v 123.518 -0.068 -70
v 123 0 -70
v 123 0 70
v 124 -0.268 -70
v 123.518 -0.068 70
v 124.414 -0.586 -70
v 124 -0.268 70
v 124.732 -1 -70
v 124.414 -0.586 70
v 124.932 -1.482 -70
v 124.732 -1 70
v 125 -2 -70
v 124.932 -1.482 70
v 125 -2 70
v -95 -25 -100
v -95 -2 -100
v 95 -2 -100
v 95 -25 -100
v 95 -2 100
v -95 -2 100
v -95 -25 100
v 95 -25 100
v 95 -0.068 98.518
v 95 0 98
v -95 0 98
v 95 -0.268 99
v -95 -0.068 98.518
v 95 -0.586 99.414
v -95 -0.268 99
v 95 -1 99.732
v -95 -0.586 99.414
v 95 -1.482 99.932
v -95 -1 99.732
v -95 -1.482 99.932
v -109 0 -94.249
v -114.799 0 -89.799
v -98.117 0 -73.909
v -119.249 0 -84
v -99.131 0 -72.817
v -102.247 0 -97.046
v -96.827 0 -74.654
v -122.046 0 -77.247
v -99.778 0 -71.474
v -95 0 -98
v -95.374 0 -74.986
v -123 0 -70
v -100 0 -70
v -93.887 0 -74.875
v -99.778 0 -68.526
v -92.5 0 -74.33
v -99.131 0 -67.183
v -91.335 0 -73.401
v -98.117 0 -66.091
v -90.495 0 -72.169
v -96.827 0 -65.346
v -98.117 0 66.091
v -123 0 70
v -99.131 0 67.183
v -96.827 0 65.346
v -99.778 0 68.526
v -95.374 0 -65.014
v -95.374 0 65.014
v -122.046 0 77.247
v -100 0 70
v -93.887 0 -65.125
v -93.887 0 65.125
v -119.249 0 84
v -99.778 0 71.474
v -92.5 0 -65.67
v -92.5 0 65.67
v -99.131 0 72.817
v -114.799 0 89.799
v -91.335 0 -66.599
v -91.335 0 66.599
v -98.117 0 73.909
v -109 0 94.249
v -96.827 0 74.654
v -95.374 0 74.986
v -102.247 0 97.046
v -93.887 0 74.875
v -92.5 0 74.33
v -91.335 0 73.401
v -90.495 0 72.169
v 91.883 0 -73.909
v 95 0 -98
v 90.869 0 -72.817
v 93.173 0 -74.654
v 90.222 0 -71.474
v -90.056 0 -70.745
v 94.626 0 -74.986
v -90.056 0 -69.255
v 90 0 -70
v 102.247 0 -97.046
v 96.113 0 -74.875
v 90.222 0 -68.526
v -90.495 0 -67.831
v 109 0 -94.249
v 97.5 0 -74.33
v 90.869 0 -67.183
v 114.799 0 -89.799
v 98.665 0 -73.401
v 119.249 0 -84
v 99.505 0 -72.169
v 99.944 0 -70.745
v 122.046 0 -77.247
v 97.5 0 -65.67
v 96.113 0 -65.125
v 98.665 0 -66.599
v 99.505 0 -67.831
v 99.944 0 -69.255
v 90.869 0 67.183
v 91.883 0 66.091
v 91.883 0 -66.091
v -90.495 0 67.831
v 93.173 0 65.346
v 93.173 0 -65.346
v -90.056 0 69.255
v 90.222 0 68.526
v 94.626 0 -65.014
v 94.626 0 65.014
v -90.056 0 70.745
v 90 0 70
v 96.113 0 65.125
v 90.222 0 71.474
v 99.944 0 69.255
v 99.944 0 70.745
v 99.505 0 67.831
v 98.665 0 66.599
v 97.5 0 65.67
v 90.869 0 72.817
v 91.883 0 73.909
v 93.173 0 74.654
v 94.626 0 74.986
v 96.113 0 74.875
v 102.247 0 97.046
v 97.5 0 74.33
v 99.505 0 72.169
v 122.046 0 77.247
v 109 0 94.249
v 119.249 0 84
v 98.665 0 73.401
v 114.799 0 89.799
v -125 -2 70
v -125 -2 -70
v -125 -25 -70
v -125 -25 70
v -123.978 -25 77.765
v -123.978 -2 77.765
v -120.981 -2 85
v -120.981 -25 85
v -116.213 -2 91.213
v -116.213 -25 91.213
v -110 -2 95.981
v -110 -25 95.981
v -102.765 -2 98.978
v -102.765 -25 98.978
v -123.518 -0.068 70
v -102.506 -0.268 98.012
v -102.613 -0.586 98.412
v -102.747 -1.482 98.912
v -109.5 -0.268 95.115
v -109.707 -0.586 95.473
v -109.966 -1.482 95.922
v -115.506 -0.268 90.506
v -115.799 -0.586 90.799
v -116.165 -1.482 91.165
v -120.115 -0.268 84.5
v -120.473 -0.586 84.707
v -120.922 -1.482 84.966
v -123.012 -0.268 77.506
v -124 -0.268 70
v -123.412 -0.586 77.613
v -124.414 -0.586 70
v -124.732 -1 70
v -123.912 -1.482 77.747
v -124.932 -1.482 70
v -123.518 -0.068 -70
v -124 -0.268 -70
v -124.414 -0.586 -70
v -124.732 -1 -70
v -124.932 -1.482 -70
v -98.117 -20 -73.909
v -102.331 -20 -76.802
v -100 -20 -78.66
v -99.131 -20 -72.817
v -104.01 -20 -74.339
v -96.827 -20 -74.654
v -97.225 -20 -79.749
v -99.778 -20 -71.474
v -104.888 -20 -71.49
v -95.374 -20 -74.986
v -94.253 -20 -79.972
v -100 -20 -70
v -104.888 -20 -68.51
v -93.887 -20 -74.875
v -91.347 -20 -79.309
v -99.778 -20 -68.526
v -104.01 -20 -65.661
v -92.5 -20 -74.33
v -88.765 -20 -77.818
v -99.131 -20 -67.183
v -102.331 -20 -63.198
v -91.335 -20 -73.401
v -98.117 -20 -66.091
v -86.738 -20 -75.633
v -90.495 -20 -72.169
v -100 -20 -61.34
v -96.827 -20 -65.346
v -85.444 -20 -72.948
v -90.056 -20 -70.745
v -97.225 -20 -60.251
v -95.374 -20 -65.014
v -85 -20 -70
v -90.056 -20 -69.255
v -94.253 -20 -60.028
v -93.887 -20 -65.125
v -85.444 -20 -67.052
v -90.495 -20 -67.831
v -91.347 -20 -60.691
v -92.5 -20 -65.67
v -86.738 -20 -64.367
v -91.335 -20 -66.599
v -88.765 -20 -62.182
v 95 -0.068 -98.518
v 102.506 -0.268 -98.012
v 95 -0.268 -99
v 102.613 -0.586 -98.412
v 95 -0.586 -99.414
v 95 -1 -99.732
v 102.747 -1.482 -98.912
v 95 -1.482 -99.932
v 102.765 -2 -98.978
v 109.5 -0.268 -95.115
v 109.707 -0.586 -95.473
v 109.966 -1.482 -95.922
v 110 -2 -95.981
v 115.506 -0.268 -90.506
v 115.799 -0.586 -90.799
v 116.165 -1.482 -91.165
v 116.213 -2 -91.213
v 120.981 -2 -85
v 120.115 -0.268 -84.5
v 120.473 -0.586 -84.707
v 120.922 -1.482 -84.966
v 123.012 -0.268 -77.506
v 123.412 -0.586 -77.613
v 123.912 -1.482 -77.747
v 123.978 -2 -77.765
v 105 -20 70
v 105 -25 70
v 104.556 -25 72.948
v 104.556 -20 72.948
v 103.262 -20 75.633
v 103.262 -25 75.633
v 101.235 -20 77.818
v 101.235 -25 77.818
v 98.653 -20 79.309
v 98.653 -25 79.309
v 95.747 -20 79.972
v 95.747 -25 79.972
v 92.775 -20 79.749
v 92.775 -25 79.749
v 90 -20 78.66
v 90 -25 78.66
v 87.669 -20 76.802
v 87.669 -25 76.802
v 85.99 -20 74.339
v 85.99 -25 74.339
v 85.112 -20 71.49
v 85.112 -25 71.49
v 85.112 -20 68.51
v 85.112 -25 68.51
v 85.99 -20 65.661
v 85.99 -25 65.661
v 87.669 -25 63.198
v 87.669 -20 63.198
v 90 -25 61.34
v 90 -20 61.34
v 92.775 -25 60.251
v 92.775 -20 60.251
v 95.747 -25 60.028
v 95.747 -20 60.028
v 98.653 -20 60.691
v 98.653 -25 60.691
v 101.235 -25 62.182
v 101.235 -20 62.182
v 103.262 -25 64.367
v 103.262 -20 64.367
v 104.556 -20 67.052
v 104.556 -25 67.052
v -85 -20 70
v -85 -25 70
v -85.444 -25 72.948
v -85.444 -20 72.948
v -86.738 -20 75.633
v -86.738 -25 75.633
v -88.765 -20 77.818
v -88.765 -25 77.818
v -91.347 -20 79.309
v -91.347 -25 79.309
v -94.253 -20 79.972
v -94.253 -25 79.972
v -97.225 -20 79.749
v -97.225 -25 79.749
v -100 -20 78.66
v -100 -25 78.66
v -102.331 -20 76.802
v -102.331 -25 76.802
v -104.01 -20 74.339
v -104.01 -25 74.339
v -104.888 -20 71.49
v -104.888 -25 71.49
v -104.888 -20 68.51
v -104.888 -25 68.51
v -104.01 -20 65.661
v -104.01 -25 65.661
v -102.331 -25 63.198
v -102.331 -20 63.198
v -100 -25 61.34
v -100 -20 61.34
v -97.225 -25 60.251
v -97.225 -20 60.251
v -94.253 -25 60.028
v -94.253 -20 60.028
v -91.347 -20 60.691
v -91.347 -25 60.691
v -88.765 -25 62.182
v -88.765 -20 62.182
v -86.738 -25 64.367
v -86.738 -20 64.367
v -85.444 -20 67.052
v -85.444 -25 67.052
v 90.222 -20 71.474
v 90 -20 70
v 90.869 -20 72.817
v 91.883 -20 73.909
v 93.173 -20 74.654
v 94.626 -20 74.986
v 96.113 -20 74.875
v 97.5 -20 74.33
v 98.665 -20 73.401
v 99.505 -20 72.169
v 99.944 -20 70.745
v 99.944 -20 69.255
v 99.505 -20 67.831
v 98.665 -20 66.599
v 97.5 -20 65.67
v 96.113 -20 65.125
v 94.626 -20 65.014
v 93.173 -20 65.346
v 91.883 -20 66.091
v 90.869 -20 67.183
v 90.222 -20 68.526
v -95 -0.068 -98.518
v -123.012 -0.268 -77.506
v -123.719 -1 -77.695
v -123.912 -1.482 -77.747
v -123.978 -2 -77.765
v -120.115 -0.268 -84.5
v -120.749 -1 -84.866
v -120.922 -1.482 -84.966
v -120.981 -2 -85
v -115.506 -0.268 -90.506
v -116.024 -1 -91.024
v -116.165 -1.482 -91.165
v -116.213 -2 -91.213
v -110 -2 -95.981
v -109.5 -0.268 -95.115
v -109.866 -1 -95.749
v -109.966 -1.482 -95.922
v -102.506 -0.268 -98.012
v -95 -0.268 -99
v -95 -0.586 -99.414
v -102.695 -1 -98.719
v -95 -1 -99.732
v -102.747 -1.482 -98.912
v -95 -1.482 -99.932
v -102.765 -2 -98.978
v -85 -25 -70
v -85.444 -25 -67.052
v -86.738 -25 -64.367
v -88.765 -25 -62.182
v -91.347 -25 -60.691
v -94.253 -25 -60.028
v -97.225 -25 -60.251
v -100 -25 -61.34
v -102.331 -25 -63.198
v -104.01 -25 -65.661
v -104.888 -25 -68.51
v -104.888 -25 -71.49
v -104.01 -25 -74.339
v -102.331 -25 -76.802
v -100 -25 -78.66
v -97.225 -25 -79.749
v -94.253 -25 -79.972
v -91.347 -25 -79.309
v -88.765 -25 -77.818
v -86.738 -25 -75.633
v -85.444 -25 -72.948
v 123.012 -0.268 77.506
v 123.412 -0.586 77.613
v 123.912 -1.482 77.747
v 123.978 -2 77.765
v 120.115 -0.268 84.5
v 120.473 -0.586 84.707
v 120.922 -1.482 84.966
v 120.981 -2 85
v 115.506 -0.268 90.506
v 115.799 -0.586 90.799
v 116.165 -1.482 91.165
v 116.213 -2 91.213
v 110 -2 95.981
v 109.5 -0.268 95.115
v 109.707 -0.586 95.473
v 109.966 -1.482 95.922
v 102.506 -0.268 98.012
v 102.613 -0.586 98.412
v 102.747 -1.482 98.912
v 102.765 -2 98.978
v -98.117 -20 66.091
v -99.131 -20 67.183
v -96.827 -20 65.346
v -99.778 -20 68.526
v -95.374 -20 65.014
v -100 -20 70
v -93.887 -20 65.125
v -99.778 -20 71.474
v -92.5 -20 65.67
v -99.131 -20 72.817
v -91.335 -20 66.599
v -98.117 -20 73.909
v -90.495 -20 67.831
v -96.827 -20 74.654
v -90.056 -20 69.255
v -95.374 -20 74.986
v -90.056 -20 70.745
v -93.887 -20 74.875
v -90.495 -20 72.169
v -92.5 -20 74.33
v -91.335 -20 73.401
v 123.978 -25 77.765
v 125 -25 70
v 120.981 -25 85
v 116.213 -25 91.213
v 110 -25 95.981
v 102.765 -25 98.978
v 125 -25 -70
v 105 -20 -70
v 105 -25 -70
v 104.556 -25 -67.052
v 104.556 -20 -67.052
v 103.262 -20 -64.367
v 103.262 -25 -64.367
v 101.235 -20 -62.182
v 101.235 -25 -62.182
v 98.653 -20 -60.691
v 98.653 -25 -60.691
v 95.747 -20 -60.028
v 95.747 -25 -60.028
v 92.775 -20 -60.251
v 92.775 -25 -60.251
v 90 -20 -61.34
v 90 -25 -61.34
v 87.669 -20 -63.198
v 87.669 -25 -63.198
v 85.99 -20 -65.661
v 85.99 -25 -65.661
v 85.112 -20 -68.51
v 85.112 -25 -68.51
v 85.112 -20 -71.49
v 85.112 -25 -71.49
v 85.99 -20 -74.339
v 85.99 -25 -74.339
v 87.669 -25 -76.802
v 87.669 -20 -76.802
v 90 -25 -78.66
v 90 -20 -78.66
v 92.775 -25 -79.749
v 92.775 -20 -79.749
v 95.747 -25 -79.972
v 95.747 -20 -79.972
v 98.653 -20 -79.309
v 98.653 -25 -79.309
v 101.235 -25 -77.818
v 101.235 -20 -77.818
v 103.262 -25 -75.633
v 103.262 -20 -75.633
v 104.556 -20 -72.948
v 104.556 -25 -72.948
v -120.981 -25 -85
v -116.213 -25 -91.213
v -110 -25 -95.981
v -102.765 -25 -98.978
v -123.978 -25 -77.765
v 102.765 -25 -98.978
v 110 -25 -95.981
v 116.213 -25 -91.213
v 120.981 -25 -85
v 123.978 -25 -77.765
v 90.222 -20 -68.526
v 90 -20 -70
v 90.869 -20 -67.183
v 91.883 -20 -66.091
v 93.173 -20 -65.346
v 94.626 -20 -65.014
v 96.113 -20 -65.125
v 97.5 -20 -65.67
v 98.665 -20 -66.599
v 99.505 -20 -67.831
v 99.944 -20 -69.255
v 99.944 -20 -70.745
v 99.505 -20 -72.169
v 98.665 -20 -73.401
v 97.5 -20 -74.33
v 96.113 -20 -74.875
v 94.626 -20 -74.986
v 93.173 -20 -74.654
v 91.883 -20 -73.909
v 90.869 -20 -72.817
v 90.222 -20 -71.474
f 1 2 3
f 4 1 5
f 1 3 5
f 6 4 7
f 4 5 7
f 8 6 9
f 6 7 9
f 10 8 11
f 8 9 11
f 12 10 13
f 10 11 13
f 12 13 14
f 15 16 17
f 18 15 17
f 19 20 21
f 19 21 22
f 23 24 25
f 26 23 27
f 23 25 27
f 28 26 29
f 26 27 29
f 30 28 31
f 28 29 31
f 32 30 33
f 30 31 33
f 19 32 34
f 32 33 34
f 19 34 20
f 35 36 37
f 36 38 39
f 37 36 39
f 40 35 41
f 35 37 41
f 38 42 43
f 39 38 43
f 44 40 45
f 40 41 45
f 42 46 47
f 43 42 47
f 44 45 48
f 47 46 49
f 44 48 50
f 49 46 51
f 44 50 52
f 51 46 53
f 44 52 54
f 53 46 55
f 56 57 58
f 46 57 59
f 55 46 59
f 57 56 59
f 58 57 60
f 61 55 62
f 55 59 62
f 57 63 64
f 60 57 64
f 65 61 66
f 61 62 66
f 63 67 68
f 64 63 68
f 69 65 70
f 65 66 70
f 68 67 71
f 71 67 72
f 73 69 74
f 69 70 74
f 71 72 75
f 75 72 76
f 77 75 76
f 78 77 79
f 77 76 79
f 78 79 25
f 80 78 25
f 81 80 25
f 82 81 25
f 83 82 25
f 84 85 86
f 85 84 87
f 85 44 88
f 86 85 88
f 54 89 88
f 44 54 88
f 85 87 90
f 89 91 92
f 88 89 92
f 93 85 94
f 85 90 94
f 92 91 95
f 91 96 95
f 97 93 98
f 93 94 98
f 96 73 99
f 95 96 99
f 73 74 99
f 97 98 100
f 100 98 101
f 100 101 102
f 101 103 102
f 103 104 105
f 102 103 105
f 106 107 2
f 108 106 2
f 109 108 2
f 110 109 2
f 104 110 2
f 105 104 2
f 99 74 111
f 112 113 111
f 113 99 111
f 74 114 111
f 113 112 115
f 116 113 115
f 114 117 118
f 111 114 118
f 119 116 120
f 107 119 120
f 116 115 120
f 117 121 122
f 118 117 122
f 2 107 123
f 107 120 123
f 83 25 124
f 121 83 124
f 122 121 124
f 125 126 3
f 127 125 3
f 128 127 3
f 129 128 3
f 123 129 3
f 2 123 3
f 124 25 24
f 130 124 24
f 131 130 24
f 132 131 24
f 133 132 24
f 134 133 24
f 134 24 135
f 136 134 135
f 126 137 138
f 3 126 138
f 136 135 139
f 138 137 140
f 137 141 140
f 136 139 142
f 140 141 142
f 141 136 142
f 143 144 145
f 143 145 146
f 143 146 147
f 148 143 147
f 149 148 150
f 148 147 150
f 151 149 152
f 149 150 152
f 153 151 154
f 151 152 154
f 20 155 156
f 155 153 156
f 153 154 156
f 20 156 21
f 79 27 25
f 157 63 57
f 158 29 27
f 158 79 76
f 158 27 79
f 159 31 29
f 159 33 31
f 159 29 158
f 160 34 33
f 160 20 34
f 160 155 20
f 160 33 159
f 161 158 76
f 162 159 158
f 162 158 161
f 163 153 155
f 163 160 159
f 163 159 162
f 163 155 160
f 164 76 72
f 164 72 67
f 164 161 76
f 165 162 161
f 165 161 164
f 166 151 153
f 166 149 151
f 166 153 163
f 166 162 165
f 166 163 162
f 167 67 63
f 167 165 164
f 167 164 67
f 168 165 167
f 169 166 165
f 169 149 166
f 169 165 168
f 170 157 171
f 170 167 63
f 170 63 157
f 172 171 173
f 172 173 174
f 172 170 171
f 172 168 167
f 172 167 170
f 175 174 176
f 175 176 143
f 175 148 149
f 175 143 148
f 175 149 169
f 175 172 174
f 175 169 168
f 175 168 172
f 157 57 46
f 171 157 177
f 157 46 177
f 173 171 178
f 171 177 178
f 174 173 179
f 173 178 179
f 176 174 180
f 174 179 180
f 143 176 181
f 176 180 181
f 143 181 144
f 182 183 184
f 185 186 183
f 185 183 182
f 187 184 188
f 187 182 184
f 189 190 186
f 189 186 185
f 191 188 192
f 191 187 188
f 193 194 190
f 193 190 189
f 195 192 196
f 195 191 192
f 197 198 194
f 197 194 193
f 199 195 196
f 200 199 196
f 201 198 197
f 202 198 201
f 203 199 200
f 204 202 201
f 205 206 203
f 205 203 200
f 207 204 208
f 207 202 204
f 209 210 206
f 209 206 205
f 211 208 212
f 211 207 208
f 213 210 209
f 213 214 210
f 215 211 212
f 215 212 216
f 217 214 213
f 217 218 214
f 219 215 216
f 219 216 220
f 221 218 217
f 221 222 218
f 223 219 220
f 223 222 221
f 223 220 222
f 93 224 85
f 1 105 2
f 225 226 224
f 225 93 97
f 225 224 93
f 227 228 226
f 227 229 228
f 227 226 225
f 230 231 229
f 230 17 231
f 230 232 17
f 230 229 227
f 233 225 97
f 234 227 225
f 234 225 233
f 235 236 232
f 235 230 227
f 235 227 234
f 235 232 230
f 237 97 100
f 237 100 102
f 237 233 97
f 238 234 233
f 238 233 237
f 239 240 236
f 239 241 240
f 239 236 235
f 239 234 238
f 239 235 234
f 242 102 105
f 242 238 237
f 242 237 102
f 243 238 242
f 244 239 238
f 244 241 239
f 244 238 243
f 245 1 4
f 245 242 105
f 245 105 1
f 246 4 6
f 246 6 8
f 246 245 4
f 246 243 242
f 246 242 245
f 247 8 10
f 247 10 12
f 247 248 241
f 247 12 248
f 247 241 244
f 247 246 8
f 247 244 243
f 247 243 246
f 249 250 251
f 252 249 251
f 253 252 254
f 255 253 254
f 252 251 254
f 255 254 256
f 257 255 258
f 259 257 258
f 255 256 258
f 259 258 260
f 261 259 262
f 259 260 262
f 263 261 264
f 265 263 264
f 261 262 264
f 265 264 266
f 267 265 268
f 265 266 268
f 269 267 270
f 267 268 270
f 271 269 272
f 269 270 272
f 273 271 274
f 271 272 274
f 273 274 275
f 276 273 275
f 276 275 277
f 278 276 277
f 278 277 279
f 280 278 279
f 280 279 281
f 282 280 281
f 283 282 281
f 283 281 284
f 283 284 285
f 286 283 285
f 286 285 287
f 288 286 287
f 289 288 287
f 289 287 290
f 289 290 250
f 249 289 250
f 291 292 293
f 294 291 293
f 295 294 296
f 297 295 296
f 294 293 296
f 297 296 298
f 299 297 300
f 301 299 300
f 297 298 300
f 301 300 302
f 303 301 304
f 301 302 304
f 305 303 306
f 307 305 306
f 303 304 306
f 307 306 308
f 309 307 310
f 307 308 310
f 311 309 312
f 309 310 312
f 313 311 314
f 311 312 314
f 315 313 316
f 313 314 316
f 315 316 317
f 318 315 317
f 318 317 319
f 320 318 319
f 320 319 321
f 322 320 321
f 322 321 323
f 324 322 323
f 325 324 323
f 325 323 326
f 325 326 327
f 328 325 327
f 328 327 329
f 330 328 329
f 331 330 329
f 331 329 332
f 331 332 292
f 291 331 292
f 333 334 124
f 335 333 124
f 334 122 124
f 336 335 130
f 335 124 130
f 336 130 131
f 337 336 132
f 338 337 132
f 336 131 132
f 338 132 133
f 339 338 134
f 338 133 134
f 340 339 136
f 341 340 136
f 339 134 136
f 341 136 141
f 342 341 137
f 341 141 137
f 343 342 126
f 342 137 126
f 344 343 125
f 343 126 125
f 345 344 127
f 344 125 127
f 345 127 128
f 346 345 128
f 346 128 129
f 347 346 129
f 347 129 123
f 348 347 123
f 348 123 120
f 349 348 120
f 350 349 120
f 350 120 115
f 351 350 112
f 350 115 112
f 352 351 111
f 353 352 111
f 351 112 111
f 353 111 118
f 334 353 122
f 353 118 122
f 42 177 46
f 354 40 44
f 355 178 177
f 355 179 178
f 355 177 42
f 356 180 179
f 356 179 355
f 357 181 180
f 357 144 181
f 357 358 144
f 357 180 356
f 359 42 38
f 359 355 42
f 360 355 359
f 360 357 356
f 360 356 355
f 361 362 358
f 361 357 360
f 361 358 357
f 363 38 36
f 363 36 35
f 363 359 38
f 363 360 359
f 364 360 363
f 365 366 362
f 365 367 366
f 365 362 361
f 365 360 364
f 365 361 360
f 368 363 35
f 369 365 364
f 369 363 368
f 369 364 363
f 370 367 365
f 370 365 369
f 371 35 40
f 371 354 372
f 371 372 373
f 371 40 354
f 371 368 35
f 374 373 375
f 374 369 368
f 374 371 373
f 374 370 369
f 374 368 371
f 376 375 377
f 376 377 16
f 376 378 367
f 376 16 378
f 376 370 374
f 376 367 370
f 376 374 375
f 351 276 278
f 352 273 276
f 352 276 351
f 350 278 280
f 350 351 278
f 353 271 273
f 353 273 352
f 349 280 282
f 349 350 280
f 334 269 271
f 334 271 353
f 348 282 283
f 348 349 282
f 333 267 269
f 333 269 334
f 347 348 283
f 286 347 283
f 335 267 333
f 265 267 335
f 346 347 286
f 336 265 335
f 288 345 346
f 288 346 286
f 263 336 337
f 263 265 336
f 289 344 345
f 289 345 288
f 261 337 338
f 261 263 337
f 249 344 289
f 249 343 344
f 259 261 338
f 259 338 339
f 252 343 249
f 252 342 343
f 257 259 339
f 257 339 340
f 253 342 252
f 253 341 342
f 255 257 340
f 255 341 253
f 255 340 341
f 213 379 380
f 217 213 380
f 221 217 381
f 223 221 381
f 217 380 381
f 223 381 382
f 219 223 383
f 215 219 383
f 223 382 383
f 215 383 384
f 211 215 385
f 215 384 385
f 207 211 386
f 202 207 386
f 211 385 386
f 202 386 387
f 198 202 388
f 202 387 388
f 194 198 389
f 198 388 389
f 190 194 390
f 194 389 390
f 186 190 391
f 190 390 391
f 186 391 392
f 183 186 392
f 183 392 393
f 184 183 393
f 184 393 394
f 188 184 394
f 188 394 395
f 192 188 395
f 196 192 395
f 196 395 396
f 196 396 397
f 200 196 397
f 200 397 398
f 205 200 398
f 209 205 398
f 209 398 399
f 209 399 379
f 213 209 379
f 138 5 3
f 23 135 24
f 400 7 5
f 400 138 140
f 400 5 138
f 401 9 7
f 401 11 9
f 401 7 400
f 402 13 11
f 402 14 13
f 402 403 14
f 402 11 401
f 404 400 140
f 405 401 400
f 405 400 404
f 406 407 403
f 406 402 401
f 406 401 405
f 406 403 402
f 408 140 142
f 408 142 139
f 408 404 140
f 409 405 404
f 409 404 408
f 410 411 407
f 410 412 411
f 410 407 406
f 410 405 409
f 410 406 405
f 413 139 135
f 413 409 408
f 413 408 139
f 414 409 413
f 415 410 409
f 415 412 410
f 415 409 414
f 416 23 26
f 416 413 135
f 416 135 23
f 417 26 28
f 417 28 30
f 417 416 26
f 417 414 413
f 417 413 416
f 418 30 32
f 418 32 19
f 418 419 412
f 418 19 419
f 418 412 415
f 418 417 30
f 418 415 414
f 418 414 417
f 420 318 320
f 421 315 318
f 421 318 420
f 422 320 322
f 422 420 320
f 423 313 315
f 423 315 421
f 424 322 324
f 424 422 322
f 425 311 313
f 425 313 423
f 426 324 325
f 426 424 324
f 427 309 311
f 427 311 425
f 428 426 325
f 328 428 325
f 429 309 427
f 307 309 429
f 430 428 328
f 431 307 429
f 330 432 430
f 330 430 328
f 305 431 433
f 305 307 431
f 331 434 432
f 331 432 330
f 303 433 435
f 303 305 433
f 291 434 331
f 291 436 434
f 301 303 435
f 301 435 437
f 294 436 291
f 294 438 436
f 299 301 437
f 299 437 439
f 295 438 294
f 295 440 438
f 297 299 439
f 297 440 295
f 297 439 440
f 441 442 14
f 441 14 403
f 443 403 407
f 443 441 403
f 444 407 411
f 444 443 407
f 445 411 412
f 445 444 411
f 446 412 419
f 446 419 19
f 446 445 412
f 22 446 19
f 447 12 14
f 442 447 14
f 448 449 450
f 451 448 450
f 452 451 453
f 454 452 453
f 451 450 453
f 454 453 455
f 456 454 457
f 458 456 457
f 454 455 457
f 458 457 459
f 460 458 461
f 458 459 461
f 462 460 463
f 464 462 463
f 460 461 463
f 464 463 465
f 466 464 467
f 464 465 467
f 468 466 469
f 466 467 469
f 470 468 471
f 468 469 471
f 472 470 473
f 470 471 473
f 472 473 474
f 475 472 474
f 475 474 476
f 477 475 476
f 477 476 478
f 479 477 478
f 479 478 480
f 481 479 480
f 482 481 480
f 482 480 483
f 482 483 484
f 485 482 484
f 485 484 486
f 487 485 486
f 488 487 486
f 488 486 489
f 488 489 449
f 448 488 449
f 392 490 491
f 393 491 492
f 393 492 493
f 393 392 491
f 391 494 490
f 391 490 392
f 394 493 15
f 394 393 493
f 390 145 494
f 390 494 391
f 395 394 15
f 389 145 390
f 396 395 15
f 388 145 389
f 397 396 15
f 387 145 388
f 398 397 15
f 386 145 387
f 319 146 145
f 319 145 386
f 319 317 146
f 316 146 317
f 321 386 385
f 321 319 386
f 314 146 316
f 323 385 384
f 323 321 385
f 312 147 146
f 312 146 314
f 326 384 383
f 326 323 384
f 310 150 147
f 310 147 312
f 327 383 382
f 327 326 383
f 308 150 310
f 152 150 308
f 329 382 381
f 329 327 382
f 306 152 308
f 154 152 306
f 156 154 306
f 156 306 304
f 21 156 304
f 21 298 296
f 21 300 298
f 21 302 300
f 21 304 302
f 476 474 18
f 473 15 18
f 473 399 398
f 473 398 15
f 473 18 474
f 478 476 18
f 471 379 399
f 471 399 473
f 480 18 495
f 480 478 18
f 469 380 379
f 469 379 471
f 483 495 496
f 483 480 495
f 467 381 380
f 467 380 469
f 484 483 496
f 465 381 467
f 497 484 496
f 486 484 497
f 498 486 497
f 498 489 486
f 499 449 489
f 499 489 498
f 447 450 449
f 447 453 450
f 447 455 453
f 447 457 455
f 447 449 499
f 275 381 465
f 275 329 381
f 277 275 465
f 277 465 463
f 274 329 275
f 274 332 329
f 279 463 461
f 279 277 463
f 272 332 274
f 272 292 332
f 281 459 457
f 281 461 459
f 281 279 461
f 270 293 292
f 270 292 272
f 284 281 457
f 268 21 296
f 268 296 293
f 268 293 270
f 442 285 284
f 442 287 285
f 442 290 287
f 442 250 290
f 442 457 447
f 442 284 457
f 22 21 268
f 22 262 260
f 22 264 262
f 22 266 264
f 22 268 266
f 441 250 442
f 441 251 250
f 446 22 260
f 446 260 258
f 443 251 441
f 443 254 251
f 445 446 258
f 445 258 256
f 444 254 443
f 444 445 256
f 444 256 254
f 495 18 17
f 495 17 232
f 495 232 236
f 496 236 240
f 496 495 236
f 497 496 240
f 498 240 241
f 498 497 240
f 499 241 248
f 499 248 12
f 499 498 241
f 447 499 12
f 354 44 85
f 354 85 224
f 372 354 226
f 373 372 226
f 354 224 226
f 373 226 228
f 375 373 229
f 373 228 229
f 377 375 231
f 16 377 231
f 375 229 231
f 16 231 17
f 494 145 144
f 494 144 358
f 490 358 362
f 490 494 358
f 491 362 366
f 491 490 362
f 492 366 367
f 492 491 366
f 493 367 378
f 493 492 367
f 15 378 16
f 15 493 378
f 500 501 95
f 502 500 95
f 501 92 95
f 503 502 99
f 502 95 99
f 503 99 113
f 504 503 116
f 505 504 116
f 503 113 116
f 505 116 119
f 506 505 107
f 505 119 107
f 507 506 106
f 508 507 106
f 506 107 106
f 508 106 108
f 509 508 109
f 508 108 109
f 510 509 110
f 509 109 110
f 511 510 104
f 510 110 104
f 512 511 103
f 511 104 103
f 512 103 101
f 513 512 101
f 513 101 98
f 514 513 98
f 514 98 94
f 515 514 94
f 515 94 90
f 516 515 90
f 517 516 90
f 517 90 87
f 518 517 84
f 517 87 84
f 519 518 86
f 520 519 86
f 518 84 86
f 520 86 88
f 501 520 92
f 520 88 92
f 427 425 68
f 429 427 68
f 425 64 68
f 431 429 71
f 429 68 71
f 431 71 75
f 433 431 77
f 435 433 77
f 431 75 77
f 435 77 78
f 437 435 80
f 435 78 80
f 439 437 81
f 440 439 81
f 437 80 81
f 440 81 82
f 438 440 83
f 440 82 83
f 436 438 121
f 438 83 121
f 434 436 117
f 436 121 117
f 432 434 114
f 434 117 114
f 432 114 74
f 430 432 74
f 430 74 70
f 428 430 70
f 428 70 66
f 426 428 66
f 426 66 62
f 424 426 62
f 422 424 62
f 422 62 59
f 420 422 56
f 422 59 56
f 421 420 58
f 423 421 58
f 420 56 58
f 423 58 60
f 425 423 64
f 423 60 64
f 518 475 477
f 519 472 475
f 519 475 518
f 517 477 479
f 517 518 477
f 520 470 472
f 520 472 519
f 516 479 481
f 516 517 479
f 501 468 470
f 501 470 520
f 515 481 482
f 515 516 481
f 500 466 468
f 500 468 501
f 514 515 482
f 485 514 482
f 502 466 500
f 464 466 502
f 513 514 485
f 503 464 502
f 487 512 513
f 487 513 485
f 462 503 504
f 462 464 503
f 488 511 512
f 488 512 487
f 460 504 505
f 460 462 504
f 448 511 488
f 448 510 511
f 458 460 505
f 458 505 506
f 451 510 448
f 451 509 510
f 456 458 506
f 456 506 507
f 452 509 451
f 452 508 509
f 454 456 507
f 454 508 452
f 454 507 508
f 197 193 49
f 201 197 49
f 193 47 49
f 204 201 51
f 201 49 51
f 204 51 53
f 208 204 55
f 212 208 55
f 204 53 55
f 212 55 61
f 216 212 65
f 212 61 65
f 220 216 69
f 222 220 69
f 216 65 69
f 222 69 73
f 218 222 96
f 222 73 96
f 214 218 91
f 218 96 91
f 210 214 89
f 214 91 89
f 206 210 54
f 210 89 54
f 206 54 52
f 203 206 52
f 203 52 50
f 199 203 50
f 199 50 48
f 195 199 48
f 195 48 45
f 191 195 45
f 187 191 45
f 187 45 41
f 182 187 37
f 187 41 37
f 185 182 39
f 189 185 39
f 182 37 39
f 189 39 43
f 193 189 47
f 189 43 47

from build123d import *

# Parameters (mm, degrees)
F0_W           = 250
F0_H           = 200
F1_DEPTH       = 25
F2_R           = 30
F4_D           = 10
F4_CBORE_D     = 20
F4_CBORE_DEPTH = 5
F5_R           = 2


with BuildPart() as f1:
    # F0 (on Front) → F1 (new body)
    with BuildSketch(Plane.XZ):
        Rectangle(F0_W, F0_H)
    extrude(amount=F1_DEPTH)

    # F2
    f2_edges = [f1.edges().sort_by_distance(p)[0] for p in [
        (-125, -12.5, 100),
        (-125, -12.5, -100),
        (125, -12.5, 100),
        (125, -12.5, -100),
    ]]
    fillet(f2_edges, radius=F2_R)

    # F4 (through all)
    with Locations(Plane.XZ.offset(25)):
        with Locations((-95, 70), (-95, -70), (95, -70), (95, 70)):
            CounterBoreHole(F4_D / 2, F4_CBORE_D / 2, F4_CBORE_DEPTH)

    # F5
    f5_edges = [f1.edges().sort_by_distance(p)[0] for p in [
        (0, 0, -100),
    ]]
    fillet(f5_edges, radius=F5_R)


solid = f1.part
